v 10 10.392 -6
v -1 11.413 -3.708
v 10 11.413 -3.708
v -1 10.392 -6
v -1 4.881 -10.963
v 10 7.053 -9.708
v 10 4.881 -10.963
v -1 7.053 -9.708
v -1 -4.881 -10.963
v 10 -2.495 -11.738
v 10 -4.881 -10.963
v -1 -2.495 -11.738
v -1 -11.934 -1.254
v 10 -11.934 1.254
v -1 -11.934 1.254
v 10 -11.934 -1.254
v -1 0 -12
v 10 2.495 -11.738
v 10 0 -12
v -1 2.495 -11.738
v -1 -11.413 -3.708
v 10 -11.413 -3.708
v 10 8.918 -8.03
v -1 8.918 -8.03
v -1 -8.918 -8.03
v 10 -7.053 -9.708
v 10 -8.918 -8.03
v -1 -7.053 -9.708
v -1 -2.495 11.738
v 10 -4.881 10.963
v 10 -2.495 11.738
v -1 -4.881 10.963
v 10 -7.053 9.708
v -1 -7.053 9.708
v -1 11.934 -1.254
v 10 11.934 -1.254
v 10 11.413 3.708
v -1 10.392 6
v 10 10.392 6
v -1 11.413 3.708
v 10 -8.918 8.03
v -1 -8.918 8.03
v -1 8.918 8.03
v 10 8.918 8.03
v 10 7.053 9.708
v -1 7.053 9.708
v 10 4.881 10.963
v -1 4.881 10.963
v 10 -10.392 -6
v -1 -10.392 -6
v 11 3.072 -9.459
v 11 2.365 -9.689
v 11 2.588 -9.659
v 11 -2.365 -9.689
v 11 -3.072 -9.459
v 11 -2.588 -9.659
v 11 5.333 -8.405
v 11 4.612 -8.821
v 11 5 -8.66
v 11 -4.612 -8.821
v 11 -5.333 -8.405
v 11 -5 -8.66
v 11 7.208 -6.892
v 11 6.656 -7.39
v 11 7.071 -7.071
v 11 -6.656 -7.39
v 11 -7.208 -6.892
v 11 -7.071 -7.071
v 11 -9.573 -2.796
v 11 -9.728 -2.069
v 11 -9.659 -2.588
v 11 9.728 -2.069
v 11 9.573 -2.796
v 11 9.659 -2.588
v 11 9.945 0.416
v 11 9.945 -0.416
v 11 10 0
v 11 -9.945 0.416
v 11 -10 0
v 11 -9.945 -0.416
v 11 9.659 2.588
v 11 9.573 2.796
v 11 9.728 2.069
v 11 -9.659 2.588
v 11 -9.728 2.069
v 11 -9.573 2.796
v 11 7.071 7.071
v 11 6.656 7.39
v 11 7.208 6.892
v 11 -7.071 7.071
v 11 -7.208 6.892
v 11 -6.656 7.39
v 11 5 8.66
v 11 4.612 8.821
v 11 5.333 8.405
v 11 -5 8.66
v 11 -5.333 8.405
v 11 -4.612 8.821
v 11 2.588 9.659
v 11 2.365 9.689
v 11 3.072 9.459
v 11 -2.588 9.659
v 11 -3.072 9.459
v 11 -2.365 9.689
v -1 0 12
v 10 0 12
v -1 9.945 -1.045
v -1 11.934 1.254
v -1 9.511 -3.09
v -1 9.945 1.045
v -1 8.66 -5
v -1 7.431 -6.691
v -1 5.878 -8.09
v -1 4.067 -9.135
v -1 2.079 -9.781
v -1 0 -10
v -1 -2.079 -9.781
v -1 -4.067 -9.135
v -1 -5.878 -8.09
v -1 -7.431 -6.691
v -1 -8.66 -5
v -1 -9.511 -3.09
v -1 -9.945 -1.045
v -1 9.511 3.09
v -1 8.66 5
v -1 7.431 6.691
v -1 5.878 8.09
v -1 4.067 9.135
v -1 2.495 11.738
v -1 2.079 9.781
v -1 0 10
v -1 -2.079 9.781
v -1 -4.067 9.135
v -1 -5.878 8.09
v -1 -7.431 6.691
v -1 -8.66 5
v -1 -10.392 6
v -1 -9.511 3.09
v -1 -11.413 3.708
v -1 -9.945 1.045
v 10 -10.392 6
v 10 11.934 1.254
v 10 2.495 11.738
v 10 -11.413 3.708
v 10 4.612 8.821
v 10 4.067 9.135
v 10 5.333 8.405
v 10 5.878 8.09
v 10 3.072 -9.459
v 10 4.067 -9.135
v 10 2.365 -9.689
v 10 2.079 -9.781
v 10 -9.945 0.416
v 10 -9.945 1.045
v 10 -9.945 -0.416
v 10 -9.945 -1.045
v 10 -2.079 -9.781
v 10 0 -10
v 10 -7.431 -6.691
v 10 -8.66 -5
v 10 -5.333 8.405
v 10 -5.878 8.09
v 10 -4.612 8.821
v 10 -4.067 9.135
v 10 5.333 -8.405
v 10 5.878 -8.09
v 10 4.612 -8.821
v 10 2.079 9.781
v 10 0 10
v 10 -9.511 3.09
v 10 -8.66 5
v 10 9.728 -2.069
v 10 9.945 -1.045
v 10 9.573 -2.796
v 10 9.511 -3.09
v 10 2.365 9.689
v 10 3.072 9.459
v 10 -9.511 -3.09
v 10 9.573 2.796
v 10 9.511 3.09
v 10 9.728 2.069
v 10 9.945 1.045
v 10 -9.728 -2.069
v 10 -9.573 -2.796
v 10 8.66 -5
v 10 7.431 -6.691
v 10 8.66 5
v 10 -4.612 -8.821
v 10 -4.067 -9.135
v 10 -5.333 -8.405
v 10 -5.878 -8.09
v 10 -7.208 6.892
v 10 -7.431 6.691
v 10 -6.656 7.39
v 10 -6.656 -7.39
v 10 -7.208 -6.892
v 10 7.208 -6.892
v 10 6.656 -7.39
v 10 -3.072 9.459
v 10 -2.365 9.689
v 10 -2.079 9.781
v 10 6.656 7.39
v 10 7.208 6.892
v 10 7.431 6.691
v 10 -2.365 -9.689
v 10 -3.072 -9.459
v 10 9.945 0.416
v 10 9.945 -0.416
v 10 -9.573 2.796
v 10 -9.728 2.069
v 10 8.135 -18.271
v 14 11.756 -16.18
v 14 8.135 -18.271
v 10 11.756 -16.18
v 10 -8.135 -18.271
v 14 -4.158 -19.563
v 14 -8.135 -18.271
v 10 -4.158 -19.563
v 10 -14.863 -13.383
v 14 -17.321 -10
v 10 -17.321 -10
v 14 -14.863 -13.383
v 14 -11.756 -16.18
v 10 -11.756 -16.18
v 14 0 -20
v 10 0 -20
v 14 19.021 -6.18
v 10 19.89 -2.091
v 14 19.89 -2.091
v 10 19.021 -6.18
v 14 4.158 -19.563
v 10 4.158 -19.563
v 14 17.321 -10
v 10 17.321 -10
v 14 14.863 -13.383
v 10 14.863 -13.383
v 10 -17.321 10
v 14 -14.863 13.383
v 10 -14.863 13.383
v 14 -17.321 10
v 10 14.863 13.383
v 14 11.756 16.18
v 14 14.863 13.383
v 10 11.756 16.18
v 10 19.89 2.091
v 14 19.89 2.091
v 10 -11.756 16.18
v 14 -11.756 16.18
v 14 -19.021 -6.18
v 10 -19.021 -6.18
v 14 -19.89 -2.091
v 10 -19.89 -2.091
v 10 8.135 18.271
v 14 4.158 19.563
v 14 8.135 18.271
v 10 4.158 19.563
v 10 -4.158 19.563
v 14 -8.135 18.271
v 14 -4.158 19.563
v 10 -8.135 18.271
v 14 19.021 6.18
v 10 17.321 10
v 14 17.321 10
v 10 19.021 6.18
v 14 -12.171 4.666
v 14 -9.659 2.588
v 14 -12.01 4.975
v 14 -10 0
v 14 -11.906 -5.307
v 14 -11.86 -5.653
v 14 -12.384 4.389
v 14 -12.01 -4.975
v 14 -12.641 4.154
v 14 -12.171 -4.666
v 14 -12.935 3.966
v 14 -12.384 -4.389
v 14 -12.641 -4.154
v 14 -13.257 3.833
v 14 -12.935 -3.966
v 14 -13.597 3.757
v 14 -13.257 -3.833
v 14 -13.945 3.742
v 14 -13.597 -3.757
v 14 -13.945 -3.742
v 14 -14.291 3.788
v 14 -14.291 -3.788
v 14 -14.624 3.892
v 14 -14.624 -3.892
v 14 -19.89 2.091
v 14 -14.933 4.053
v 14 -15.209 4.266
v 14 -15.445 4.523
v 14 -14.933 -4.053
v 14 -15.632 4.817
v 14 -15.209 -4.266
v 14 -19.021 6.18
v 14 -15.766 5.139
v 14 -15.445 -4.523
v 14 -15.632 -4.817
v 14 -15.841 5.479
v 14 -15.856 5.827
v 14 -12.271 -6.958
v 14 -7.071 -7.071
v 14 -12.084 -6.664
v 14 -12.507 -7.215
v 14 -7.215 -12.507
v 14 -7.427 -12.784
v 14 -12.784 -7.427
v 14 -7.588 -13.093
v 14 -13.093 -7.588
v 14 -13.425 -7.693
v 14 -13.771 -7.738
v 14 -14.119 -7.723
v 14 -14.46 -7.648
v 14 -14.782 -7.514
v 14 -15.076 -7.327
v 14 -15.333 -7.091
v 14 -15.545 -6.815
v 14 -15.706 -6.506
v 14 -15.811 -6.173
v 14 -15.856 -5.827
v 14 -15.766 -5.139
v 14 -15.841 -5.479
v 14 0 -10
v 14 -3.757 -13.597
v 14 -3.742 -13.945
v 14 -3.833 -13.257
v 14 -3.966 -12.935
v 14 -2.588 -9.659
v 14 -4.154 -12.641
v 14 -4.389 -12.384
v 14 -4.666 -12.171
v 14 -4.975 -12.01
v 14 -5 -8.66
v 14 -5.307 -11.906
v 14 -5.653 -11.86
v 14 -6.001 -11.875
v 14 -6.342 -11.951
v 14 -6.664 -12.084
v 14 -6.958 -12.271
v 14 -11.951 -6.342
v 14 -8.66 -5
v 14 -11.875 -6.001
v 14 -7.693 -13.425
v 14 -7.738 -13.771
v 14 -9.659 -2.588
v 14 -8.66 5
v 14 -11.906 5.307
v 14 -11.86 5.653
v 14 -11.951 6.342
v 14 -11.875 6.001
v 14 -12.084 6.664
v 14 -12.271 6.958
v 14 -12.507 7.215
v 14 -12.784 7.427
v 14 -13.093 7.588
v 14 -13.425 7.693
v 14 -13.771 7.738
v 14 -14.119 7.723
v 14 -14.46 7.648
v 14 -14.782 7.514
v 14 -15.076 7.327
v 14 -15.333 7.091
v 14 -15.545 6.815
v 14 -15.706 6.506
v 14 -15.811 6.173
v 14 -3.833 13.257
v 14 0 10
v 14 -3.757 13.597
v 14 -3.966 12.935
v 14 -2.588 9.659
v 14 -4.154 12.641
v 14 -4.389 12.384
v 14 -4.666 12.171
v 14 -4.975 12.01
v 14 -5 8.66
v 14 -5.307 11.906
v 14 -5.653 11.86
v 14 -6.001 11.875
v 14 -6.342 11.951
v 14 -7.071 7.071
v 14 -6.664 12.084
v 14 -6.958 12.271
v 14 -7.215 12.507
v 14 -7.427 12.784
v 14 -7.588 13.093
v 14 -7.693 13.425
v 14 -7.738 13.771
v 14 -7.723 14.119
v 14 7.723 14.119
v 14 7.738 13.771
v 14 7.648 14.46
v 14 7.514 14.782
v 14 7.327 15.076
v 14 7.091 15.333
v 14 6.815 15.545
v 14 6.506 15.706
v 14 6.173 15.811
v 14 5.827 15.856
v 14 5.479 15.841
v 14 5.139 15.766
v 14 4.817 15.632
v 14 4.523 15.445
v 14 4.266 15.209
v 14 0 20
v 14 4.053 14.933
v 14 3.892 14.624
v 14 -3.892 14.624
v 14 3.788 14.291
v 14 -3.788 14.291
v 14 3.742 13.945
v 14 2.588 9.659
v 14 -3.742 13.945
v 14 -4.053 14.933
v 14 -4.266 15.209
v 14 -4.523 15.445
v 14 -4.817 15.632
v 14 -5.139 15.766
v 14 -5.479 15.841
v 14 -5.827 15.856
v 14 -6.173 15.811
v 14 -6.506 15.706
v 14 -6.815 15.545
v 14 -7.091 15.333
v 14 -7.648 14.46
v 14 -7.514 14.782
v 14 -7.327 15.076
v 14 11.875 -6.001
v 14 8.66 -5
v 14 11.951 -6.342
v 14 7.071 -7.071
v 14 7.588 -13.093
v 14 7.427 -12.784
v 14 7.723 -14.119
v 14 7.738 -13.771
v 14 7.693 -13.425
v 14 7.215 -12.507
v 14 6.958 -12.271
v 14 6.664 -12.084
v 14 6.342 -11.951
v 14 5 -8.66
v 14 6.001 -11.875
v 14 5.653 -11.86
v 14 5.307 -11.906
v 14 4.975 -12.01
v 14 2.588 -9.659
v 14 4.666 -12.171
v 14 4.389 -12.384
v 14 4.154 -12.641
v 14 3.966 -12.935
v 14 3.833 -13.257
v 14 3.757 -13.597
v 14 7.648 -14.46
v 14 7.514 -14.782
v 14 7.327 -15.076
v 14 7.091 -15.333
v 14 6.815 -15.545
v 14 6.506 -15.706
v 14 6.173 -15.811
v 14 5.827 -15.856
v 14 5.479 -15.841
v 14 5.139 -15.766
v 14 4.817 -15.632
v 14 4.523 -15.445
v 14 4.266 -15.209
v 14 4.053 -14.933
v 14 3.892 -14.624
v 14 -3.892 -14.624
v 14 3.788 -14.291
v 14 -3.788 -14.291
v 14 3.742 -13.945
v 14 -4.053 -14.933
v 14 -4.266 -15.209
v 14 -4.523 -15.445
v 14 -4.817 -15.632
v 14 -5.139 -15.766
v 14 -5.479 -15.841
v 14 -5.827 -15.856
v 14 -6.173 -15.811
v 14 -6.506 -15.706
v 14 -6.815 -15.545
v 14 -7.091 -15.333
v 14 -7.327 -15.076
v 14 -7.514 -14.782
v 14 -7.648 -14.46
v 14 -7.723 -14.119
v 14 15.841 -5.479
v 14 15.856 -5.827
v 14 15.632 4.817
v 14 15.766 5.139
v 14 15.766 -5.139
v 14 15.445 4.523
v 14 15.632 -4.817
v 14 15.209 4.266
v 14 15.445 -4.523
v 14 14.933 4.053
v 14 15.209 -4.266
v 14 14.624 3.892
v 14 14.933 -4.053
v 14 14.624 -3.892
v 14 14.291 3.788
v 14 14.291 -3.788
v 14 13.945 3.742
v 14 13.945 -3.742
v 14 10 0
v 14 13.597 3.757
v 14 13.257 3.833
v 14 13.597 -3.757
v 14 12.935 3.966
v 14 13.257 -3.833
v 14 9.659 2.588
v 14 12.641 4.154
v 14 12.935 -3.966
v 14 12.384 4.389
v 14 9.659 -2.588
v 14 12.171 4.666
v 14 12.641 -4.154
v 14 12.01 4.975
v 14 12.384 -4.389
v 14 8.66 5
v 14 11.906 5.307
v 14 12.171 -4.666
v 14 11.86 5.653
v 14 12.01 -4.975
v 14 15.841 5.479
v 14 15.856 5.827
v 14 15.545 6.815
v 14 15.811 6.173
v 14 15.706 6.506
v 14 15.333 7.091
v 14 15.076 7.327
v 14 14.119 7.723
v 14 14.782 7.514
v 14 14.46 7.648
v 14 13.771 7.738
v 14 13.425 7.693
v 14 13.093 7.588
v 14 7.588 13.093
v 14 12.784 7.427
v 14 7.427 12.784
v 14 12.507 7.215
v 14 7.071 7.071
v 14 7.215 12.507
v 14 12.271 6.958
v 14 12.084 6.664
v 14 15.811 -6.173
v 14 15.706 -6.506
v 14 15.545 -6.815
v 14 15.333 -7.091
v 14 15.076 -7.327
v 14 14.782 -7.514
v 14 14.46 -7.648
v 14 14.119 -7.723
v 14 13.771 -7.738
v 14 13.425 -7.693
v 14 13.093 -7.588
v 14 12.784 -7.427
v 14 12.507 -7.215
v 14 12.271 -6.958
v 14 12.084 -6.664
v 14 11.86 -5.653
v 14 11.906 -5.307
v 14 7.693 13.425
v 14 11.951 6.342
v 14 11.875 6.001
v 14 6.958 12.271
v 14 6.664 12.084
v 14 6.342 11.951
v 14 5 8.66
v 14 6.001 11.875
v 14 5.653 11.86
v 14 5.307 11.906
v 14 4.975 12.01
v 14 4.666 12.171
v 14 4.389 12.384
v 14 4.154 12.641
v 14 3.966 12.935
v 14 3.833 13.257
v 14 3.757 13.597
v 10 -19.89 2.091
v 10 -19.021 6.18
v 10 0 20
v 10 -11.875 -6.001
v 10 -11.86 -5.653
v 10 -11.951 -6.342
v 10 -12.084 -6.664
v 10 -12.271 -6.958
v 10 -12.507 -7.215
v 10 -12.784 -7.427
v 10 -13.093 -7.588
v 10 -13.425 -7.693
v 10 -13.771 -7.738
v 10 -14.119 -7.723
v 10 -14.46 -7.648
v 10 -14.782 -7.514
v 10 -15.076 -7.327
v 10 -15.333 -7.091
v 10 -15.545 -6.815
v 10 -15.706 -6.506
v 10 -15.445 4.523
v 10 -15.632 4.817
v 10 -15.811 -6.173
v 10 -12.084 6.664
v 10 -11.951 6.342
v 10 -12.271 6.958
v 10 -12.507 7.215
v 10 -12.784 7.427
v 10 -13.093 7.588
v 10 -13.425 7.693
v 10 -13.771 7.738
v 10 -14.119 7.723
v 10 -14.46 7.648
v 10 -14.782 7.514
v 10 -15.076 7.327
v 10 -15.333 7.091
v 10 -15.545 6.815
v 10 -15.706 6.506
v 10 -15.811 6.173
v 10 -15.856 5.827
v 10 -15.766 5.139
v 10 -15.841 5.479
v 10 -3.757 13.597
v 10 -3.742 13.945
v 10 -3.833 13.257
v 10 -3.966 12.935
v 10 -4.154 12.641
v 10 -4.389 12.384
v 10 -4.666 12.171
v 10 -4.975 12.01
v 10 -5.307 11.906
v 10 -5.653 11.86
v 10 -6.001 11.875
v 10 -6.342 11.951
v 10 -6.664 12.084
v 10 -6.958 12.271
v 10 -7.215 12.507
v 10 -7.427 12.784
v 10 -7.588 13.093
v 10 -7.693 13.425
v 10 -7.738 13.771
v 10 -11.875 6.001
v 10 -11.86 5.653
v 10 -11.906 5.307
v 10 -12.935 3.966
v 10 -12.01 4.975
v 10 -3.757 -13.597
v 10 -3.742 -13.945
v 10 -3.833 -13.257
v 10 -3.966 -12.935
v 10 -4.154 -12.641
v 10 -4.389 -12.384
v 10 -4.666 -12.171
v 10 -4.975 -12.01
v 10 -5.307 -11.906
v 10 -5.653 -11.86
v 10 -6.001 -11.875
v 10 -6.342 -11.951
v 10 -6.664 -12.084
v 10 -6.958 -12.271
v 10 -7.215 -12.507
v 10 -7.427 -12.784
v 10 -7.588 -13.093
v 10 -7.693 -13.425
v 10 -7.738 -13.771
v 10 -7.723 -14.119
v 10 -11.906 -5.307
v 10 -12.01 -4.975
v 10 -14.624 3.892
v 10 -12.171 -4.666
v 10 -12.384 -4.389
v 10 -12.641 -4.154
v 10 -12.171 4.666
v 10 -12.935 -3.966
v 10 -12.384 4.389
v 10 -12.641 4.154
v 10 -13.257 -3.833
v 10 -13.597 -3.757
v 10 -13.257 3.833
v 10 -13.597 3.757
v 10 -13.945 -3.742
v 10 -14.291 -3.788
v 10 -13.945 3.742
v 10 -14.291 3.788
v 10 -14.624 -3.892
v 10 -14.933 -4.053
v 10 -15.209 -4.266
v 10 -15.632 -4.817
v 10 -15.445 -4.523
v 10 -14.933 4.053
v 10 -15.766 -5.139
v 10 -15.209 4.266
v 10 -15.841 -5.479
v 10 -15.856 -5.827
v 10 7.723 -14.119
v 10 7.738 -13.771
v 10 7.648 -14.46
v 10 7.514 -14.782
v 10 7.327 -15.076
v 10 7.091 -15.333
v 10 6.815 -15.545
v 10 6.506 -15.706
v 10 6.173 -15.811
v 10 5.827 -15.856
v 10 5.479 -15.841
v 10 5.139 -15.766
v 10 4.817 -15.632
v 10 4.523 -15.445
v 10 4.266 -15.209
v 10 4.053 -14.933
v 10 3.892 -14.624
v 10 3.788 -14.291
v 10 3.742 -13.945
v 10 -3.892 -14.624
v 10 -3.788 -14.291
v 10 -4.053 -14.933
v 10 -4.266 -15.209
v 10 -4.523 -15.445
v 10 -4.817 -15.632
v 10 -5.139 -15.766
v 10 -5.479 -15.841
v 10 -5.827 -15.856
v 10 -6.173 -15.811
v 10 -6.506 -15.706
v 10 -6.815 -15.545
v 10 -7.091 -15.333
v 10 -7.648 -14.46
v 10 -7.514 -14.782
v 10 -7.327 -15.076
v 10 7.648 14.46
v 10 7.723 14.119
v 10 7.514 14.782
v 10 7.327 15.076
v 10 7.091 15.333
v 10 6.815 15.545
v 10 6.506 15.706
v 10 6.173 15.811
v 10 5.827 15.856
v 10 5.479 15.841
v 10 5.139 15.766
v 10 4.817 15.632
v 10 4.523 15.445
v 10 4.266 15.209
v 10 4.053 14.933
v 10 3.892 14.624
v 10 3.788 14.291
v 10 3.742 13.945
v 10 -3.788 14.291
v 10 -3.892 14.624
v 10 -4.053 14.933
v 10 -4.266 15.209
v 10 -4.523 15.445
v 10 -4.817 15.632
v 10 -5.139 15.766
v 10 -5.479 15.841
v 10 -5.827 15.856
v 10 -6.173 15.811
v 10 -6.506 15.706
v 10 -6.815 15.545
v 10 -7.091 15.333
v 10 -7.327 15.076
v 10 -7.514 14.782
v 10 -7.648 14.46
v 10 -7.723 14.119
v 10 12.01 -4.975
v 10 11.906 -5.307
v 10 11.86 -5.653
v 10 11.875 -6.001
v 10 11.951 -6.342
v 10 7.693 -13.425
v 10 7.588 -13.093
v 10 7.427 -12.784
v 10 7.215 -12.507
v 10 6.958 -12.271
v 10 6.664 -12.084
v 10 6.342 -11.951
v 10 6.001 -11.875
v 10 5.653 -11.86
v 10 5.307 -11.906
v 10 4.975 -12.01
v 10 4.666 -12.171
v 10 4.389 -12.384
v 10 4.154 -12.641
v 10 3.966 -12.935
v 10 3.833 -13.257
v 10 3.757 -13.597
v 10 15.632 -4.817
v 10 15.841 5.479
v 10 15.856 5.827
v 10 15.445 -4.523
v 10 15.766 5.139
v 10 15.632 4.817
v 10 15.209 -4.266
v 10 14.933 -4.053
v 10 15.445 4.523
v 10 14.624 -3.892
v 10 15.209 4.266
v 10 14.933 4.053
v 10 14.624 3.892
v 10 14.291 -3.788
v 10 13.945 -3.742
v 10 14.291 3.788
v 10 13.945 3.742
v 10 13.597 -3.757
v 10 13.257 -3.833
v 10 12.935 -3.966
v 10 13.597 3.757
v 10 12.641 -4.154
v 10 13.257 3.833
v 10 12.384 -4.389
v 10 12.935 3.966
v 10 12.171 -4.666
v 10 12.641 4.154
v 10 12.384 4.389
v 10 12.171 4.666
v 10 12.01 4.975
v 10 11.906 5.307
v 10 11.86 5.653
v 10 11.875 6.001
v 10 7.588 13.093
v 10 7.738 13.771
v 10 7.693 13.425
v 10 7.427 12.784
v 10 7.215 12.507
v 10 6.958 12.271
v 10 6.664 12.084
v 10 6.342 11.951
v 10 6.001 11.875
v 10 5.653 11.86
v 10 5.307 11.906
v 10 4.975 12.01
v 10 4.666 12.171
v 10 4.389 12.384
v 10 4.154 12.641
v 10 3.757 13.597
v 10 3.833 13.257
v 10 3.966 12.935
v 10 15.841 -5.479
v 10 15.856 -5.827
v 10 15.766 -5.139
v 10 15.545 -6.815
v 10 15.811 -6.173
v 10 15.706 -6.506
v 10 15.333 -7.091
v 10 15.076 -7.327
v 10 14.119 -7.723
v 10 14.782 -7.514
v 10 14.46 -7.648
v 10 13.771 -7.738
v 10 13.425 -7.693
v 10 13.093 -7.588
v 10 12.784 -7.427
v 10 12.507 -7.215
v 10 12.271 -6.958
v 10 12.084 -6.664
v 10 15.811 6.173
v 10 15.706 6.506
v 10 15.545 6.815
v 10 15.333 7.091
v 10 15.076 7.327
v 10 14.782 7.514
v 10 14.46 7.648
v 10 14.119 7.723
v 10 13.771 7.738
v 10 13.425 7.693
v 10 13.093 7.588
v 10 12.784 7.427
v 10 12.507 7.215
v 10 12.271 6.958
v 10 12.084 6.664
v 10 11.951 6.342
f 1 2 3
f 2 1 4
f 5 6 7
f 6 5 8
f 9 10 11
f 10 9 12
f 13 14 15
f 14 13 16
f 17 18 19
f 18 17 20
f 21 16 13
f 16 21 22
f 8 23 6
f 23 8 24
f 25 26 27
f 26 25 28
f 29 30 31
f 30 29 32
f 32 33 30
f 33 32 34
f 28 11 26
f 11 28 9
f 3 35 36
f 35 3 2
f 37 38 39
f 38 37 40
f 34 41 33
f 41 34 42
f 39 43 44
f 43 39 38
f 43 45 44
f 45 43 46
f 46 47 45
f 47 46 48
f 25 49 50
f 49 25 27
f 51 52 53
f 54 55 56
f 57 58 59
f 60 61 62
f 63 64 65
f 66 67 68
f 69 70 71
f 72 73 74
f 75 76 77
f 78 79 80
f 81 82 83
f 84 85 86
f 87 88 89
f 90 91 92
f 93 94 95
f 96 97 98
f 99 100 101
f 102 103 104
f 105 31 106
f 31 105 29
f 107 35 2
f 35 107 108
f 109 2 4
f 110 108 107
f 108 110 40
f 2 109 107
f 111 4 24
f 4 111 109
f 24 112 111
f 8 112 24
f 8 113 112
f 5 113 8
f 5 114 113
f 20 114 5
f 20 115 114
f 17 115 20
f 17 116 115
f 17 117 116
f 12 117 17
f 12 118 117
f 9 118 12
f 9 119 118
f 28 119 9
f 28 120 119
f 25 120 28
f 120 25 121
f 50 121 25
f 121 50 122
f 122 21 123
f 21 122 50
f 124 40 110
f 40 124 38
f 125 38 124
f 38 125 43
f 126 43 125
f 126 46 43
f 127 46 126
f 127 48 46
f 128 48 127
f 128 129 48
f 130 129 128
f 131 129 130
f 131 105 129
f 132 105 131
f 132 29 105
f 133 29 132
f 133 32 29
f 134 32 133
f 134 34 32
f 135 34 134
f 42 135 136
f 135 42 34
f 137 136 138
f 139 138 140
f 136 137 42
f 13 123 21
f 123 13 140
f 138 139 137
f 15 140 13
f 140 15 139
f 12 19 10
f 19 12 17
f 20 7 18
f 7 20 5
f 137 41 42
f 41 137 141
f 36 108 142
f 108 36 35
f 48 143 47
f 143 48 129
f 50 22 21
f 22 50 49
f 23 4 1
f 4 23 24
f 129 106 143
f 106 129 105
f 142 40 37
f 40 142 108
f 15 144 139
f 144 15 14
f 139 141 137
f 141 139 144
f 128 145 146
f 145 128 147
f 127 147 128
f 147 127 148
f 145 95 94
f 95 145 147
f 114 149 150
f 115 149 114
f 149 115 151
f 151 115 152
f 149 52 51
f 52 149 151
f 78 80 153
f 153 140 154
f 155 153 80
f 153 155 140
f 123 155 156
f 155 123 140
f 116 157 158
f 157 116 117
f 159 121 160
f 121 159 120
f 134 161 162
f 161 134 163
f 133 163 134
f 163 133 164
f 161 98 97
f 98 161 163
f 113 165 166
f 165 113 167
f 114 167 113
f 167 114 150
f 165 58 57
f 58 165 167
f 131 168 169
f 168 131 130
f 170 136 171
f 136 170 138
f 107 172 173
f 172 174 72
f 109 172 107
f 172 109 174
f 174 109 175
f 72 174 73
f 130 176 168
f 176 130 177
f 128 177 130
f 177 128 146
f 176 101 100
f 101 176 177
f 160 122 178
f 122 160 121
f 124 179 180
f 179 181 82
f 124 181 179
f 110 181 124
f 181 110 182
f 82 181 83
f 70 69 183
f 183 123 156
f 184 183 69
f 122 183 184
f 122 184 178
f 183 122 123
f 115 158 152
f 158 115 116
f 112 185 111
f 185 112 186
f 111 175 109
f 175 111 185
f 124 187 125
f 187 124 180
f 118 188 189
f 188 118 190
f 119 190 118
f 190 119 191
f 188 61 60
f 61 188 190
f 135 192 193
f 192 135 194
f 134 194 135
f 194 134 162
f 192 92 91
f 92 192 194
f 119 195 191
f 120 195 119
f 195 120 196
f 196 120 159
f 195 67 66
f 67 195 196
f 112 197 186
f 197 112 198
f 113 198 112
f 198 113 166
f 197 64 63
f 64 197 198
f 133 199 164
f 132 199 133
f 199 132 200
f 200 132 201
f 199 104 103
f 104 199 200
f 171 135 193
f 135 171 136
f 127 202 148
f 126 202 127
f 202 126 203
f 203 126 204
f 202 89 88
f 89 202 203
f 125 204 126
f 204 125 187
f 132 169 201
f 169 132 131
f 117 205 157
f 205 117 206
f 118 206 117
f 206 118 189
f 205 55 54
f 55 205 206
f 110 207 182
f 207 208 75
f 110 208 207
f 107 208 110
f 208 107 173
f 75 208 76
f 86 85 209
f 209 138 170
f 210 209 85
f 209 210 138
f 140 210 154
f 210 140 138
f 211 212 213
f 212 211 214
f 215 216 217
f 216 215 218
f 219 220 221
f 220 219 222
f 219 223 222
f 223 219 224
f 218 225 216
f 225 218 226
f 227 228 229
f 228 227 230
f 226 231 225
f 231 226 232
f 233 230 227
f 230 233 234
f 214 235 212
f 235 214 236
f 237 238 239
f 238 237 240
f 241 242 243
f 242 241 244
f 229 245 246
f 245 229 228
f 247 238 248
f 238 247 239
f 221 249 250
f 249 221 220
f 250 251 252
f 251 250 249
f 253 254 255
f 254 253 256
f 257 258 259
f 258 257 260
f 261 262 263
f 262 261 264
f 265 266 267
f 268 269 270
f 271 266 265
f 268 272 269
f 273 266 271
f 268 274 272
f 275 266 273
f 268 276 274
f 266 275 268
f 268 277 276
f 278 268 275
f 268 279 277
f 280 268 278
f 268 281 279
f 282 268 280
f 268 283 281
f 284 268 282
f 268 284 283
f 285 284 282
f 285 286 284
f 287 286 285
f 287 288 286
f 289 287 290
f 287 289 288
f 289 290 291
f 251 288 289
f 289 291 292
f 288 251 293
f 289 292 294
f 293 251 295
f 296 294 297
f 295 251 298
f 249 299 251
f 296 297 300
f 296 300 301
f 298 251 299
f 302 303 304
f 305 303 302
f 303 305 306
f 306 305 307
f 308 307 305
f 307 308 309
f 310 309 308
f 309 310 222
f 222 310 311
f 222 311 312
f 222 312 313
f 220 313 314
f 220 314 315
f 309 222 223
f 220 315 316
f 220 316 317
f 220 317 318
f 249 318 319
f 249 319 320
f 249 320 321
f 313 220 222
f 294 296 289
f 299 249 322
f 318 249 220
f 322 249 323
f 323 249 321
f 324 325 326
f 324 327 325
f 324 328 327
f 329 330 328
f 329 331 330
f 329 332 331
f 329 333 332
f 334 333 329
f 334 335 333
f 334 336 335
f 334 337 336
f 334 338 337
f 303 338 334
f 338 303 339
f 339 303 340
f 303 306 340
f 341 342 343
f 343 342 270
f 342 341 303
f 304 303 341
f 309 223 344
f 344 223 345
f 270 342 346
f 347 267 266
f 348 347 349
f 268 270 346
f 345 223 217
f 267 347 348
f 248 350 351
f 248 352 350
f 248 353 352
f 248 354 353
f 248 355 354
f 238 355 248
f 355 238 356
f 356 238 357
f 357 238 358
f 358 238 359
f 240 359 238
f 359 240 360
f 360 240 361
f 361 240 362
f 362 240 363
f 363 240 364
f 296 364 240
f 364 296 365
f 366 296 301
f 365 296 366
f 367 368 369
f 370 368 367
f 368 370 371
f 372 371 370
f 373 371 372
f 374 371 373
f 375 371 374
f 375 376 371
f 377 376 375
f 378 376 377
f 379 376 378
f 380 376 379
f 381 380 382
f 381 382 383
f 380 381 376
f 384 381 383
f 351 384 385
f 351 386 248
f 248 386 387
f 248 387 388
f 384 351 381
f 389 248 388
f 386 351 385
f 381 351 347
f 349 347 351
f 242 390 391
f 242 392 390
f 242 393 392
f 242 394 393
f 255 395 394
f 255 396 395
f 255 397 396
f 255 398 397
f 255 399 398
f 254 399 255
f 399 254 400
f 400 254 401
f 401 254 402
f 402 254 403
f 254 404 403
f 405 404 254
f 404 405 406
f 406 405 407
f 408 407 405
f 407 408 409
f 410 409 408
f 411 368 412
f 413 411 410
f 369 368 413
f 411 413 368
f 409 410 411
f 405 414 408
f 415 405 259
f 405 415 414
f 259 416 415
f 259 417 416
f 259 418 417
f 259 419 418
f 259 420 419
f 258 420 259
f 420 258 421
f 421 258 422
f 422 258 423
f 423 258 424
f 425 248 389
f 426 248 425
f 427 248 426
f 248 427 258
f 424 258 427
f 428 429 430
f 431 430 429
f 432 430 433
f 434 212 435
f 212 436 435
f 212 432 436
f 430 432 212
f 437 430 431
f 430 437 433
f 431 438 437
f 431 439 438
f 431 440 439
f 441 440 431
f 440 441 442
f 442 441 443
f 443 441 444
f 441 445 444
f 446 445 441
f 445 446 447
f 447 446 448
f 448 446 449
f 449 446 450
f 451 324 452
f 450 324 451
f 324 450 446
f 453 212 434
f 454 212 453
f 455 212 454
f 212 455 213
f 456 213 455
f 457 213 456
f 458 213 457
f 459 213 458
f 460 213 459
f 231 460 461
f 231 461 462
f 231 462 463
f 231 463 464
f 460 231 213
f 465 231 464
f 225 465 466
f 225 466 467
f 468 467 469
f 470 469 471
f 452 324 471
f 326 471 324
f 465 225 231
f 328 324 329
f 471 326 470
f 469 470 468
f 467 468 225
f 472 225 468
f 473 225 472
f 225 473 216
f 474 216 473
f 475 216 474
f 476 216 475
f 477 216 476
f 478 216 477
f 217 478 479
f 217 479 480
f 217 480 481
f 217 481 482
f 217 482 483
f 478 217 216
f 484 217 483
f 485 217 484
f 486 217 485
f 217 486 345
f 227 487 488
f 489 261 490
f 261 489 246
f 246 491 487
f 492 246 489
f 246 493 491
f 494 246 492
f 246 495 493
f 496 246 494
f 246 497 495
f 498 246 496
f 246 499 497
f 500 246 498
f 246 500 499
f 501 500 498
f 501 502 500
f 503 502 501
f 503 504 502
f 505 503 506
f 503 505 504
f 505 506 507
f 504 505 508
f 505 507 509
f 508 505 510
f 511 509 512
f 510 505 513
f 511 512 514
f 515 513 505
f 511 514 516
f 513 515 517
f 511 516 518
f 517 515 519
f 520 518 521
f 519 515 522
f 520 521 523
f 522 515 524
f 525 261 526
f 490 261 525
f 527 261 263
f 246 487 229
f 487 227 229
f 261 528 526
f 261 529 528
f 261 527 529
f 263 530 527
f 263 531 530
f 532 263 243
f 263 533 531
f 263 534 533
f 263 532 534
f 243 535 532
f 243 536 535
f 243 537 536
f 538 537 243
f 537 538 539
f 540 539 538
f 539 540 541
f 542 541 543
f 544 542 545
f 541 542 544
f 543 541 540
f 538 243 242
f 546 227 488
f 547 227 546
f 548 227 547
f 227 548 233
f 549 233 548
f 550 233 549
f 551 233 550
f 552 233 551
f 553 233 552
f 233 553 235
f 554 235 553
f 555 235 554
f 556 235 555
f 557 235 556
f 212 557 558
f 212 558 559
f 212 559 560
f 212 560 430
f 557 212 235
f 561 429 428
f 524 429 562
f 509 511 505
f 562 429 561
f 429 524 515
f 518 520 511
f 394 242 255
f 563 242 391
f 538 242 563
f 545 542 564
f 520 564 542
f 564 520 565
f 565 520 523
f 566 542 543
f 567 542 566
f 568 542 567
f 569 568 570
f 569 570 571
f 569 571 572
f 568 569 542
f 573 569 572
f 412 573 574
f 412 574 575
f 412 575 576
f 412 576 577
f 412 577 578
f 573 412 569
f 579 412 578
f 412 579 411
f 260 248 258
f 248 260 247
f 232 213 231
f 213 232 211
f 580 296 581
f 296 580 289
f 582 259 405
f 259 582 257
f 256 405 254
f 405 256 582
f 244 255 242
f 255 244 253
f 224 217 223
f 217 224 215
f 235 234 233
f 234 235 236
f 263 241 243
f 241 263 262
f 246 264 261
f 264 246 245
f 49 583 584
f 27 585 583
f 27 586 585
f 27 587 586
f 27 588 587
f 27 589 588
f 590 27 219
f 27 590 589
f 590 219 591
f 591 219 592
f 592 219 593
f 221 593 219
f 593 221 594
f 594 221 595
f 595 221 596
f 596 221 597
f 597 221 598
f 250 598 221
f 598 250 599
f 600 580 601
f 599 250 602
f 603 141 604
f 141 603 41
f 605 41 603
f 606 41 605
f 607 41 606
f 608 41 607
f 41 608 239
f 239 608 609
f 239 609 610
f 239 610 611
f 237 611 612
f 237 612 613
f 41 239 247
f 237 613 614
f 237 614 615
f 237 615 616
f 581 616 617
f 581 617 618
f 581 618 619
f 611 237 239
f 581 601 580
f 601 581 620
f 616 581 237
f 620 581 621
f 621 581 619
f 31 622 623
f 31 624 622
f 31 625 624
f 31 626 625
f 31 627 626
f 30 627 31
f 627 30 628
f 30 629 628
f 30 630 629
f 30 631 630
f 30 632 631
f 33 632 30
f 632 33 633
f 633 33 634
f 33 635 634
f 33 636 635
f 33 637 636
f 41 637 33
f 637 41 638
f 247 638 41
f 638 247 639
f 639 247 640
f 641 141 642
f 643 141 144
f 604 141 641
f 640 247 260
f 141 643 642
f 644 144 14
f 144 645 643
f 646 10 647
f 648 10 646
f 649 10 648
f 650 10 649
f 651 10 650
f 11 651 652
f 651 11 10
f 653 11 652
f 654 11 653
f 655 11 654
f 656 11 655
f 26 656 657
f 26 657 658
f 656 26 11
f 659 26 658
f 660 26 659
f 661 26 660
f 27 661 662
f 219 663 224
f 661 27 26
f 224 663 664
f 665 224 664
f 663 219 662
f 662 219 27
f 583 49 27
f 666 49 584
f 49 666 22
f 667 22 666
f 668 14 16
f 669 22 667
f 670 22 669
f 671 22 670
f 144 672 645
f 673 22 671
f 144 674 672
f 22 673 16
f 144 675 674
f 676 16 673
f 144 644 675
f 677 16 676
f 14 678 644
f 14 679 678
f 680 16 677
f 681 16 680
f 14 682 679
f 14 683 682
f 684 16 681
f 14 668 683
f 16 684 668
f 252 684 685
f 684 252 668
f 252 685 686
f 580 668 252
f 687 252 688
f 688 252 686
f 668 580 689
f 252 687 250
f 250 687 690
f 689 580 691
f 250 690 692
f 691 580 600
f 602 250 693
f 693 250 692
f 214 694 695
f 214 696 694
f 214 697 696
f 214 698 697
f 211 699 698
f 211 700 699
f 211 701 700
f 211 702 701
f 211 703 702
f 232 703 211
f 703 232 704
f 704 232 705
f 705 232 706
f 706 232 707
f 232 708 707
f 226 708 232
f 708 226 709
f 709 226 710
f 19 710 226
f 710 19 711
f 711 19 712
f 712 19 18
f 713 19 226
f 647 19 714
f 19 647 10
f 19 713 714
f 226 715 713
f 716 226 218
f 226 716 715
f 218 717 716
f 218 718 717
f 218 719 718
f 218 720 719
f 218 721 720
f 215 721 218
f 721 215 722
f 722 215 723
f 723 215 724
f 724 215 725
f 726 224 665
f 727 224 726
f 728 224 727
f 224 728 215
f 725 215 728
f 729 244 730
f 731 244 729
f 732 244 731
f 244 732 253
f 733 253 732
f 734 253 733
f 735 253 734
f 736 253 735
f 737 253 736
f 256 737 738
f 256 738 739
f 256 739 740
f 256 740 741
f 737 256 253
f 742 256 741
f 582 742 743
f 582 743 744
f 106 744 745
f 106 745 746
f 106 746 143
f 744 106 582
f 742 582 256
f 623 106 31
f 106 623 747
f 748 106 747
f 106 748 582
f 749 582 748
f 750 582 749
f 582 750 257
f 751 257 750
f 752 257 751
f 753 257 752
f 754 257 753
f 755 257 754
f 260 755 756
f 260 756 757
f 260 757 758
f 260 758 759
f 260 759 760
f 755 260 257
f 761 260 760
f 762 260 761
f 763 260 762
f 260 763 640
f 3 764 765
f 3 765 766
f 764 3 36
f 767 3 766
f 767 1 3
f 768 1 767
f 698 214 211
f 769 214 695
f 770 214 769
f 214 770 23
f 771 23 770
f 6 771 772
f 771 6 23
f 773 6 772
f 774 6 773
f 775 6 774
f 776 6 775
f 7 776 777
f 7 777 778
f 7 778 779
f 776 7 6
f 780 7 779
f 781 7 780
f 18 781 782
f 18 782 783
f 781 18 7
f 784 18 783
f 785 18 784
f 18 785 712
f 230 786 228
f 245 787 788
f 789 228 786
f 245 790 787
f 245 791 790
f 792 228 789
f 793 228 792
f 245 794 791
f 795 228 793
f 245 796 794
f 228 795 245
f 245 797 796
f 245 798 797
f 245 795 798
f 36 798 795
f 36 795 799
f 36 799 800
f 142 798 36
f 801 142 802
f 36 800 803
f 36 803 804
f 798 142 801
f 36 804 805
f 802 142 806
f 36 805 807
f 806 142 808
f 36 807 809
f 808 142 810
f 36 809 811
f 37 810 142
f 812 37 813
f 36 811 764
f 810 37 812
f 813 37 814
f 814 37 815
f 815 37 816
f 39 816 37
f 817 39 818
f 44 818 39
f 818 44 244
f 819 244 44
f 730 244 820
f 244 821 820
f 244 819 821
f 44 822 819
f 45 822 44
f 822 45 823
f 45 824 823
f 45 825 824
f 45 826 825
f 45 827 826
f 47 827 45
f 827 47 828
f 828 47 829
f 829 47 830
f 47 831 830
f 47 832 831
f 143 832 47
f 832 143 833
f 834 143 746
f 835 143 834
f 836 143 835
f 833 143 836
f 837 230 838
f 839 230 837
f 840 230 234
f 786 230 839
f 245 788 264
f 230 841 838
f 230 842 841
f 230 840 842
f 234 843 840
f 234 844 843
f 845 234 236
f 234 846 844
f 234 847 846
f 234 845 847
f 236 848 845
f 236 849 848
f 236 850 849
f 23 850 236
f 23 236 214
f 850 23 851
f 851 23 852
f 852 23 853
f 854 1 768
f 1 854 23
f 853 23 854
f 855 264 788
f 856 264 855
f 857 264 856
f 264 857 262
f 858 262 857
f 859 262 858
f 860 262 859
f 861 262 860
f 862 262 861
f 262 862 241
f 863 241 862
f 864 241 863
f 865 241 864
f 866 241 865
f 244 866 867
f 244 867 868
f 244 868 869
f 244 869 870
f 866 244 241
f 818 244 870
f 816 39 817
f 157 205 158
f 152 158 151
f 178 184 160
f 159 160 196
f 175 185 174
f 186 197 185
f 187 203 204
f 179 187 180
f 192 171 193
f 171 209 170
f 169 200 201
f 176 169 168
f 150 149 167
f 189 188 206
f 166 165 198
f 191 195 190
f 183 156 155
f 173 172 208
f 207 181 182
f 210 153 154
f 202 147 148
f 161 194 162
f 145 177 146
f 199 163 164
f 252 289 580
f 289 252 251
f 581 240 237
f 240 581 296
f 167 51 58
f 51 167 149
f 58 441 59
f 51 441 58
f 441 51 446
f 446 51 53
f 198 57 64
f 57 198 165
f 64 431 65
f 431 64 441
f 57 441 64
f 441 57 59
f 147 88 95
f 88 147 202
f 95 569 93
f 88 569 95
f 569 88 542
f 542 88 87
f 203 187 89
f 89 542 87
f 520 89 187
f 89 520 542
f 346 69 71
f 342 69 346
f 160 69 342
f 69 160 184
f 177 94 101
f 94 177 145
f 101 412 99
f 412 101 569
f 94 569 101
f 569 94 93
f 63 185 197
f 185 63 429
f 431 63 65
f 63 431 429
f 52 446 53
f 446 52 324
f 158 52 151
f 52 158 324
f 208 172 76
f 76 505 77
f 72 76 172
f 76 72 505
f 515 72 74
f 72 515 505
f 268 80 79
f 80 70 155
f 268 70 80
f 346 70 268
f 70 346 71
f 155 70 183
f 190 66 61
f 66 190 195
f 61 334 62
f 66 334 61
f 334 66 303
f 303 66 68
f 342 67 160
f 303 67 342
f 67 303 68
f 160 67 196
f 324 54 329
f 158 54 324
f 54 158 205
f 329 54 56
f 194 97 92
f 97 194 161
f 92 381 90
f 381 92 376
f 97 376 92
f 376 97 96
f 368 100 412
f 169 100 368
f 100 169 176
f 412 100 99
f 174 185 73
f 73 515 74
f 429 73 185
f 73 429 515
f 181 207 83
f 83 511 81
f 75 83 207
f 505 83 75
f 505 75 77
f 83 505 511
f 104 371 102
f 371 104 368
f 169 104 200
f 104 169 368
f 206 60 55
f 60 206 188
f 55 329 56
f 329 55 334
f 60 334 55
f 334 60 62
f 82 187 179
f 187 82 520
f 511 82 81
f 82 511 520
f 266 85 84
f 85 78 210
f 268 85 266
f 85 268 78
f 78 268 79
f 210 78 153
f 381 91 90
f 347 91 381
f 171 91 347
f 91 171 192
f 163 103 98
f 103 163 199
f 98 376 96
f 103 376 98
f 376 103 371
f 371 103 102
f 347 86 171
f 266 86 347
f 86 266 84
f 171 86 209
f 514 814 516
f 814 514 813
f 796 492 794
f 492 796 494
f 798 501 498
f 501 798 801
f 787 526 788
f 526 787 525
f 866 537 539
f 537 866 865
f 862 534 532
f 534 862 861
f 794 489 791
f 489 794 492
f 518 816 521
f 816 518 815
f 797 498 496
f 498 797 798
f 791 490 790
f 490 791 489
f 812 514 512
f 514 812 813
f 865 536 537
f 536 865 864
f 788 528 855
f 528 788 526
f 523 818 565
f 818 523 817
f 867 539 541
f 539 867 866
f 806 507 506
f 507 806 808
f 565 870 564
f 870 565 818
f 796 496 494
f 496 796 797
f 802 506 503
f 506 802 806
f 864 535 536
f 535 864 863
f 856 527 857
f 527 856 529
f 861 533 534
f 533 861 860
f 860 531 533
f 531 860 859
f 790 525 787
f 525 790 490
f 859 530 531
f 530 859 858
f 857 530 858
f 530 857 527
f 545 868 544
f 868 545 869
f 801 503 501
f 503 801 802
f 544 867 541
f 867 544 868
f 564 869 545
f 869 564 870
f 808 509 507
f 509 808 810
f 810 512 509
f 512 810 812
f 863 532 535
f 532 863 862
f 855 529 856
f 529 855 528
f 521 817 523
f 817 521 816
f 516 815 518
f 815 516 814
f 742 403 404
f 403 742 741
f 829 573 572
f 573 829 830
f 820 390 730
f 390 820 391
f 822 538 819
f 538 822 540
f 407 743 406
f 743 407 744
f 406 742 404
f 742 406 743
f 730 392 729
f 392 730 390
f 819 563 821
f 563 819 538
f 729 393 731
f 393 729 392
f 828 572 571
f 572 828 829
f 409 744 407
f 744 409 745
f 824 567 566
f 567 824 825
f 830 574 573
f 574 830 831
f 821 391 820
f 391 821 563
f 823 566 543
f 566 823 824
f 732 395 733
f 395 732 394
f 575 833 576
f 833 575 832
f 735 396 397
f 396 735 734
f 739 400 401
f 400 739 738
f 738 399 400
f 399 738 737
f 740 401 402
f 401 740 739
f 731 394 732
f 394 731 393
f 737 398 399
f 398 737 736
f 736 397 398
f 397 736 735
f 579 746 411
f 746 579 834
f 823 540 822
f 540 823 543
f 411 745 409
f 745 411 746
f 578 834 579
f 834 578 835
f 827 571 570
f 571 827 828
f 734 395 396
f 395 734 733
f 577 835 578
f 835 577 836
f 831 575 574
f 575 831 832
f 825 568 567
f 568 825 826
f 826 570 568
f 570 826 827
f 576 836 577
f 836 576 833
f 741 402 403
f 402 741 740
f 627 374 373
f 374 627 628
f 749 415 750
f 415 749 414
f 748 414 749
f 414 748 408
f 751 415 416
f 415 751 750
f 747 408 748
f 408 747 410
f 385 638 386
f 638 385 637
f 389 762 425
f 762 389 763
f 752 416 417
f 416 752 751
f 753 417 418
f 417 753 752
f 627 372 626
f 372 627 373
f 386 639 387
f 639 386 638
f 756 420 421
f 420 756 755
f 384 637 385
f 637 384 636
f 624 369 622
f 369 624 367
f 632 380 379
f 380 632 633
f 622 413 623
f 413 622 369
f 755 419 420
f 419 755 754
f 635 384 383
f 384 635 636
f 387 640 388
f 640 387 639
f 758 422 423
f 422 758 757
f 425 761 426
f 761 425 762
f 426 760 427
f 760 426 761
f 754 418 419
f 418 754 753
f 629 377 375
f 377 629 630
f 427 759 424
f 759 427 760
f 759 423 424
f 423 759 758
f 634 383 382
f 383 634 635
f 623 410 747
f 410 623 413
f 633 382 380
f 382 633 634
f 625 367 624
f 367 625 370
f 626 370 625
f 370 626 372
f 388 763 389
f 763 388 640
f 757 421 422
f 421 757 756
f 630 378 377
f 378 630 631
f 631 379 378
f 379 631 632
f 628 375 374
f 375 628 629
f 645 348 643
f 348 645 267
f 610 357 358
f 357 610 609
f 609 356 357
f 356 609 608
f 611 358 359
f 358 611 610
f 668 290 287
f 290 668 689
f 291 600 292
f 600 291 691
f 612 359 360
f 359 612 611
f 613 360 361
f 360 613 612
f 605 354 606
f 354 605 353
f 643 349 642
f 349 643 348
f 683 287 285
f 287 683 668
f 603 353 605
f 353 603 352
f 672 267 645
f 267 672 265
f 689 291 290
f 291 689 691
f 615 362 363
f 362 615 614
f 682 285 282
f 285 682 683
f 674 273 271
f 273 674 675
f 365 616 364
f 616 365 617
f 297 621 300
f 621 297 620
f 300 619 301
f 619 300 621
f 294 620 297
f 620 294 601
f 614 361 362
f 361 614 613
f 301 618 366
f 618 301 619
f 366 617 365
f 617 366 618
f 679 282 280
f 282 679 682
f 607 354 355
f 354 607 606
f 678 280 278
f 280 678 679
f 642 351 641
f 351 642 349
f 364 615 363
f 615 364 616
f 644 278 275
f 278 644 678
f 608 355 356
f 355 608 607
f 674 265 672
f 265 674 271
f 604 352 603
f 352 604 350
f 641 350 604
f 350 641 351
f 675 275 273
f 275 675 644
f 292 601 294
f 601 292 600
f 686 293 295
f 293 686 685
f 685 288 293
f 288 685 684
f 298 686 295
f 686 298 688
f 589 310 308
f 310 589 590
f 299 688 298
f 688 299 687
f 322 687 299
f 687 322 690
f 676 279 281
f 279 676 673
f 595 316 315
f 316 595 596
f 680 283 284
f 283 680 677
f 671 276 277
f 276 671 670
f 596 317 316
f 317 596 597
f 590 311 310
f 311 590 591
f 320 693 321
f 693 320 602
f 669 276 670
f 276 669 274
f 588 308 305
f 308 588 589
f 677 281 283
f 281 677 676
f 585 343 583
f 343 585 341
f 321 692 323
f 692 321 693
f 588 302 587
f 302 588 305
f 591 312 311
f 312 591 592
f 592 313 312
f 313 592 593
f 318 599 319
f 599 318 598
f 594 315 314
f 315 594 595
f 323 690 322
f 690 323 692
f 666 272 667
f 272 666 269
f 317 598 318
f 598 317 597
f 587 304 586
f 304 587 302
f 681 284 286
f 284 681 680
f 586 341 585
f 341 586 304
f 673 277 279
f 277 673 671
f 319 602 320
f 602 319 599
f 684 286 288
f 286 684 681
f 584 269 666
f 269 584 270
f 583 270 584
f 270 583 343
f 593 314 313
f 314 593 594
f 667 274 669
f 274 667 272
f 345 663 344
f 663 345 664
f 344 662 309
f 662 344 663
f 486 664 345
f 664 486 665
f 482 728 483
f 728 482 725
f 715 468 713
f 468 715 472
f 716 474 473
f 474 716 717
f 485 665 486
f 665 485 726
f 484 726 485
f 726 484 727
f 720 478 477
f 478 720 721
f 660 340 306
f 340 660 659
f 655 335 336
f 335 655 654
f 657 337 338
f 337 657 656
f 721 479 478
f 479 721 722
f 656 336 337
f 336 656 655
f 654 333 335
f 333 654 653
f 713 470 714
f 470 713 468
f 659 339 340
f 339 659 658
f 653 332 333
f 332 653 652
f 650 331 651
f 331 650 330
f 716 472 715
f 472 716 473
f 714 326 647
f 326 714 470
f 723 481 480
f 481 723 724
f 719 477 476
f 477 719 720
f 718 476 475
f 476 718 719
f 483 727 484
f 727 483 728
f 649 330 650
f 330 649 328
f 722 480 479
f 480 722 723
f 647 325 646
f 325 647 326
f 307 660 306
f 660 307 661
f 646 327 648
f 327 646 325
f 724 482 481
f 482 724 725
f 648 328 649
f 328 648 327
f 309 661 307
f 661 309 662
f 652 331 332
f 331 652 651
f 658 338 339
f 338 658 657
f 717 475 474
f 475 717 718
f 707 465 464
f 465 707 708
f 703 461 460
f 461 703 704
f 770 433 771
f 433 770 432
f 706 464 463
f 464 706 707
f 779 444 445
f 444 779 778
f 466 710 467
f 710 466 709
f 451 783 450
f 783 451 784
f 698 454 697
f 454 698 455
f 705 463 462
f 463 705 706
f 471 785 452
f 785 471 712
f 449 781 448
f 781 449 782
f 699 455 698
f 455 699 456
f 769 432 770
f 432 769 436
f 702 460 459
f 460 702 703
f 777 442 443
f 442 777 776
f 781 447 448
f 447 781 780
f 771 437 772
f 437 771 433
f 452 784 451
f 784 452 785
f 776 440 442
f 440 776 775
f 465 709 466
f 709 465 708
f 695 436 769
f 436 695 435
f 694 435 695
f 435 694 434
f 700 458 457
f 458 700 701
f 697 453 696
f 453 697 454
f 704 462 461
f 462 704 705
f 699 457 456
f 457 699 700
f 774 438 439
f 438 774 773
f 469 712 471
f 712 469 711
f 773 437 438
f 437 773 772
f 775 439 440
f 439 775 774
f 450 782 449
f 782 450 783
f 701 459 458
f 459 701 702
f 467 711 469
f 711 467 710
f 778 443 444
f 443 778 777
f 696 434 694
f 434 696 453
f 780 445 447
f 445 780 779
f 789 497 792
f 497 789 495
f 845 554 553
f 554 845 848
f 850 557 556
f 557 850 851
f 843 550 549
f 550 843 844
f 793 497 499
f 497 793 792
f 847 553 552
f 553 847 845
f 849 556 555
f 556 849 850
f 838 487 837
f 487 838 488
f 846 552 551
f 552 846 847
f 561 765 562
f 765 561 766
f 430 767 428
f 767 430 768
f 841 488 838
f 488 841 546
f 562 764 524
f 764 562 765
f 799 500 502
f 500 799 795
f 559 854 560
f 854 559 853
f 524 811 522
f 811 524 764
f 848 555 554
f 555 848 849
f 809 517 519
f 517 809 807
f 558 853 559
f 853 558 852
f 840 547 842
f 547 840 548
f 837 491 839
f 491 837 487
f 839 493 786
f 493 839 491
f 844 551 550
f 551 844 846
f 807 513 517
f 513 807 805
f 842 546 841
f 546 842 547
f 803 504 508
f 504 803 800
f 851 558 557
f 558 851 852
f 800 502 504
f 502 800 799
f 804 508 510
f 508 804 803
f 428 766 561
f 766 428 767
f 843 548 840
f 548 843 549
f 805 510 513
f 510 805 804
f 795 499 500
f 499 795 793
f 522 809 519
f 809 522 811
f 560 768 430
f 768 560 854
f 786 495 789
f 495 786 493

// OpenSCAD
module flangeBody(){
	difference(){
		//tubeBody
		translate([5,0,0]) rotate([0,90,0]) cylinder(h=12,r=12,center=true);
		//throat
		translate([5,0,0]) rotate([0,90,0]) cylinder(h=13,r=10,center=true);
	}
}

module flangeFace(){
	difference(){
		union(){
			difference(){
				//flange
				translate([12,0,0]) rotate([0,90,0]) cylinder(r=20,h=4,center=true);
				//flangeThroat
				translate([12,0,0]) rotate([0,90,0]) cylinder(r=10,h=5,$fn=24,center=true);
			}
		}
		//tubeMountingHoles
		rotate([22.5,0,0]){
			for ( v = [0 : 8] ){
				rotate( v * 360 / 8, [1, 0, 0]){
					translate([12, 15, 0]){
						rotate([0,90,0]){
							cylinder(r=2,h=5,$fn=36,center=true);
						}
					}
				}
			}
		}
	}
}

module flange(){
	union(){
		flangeBody();
		flangeFace();
	}
}

flange();
